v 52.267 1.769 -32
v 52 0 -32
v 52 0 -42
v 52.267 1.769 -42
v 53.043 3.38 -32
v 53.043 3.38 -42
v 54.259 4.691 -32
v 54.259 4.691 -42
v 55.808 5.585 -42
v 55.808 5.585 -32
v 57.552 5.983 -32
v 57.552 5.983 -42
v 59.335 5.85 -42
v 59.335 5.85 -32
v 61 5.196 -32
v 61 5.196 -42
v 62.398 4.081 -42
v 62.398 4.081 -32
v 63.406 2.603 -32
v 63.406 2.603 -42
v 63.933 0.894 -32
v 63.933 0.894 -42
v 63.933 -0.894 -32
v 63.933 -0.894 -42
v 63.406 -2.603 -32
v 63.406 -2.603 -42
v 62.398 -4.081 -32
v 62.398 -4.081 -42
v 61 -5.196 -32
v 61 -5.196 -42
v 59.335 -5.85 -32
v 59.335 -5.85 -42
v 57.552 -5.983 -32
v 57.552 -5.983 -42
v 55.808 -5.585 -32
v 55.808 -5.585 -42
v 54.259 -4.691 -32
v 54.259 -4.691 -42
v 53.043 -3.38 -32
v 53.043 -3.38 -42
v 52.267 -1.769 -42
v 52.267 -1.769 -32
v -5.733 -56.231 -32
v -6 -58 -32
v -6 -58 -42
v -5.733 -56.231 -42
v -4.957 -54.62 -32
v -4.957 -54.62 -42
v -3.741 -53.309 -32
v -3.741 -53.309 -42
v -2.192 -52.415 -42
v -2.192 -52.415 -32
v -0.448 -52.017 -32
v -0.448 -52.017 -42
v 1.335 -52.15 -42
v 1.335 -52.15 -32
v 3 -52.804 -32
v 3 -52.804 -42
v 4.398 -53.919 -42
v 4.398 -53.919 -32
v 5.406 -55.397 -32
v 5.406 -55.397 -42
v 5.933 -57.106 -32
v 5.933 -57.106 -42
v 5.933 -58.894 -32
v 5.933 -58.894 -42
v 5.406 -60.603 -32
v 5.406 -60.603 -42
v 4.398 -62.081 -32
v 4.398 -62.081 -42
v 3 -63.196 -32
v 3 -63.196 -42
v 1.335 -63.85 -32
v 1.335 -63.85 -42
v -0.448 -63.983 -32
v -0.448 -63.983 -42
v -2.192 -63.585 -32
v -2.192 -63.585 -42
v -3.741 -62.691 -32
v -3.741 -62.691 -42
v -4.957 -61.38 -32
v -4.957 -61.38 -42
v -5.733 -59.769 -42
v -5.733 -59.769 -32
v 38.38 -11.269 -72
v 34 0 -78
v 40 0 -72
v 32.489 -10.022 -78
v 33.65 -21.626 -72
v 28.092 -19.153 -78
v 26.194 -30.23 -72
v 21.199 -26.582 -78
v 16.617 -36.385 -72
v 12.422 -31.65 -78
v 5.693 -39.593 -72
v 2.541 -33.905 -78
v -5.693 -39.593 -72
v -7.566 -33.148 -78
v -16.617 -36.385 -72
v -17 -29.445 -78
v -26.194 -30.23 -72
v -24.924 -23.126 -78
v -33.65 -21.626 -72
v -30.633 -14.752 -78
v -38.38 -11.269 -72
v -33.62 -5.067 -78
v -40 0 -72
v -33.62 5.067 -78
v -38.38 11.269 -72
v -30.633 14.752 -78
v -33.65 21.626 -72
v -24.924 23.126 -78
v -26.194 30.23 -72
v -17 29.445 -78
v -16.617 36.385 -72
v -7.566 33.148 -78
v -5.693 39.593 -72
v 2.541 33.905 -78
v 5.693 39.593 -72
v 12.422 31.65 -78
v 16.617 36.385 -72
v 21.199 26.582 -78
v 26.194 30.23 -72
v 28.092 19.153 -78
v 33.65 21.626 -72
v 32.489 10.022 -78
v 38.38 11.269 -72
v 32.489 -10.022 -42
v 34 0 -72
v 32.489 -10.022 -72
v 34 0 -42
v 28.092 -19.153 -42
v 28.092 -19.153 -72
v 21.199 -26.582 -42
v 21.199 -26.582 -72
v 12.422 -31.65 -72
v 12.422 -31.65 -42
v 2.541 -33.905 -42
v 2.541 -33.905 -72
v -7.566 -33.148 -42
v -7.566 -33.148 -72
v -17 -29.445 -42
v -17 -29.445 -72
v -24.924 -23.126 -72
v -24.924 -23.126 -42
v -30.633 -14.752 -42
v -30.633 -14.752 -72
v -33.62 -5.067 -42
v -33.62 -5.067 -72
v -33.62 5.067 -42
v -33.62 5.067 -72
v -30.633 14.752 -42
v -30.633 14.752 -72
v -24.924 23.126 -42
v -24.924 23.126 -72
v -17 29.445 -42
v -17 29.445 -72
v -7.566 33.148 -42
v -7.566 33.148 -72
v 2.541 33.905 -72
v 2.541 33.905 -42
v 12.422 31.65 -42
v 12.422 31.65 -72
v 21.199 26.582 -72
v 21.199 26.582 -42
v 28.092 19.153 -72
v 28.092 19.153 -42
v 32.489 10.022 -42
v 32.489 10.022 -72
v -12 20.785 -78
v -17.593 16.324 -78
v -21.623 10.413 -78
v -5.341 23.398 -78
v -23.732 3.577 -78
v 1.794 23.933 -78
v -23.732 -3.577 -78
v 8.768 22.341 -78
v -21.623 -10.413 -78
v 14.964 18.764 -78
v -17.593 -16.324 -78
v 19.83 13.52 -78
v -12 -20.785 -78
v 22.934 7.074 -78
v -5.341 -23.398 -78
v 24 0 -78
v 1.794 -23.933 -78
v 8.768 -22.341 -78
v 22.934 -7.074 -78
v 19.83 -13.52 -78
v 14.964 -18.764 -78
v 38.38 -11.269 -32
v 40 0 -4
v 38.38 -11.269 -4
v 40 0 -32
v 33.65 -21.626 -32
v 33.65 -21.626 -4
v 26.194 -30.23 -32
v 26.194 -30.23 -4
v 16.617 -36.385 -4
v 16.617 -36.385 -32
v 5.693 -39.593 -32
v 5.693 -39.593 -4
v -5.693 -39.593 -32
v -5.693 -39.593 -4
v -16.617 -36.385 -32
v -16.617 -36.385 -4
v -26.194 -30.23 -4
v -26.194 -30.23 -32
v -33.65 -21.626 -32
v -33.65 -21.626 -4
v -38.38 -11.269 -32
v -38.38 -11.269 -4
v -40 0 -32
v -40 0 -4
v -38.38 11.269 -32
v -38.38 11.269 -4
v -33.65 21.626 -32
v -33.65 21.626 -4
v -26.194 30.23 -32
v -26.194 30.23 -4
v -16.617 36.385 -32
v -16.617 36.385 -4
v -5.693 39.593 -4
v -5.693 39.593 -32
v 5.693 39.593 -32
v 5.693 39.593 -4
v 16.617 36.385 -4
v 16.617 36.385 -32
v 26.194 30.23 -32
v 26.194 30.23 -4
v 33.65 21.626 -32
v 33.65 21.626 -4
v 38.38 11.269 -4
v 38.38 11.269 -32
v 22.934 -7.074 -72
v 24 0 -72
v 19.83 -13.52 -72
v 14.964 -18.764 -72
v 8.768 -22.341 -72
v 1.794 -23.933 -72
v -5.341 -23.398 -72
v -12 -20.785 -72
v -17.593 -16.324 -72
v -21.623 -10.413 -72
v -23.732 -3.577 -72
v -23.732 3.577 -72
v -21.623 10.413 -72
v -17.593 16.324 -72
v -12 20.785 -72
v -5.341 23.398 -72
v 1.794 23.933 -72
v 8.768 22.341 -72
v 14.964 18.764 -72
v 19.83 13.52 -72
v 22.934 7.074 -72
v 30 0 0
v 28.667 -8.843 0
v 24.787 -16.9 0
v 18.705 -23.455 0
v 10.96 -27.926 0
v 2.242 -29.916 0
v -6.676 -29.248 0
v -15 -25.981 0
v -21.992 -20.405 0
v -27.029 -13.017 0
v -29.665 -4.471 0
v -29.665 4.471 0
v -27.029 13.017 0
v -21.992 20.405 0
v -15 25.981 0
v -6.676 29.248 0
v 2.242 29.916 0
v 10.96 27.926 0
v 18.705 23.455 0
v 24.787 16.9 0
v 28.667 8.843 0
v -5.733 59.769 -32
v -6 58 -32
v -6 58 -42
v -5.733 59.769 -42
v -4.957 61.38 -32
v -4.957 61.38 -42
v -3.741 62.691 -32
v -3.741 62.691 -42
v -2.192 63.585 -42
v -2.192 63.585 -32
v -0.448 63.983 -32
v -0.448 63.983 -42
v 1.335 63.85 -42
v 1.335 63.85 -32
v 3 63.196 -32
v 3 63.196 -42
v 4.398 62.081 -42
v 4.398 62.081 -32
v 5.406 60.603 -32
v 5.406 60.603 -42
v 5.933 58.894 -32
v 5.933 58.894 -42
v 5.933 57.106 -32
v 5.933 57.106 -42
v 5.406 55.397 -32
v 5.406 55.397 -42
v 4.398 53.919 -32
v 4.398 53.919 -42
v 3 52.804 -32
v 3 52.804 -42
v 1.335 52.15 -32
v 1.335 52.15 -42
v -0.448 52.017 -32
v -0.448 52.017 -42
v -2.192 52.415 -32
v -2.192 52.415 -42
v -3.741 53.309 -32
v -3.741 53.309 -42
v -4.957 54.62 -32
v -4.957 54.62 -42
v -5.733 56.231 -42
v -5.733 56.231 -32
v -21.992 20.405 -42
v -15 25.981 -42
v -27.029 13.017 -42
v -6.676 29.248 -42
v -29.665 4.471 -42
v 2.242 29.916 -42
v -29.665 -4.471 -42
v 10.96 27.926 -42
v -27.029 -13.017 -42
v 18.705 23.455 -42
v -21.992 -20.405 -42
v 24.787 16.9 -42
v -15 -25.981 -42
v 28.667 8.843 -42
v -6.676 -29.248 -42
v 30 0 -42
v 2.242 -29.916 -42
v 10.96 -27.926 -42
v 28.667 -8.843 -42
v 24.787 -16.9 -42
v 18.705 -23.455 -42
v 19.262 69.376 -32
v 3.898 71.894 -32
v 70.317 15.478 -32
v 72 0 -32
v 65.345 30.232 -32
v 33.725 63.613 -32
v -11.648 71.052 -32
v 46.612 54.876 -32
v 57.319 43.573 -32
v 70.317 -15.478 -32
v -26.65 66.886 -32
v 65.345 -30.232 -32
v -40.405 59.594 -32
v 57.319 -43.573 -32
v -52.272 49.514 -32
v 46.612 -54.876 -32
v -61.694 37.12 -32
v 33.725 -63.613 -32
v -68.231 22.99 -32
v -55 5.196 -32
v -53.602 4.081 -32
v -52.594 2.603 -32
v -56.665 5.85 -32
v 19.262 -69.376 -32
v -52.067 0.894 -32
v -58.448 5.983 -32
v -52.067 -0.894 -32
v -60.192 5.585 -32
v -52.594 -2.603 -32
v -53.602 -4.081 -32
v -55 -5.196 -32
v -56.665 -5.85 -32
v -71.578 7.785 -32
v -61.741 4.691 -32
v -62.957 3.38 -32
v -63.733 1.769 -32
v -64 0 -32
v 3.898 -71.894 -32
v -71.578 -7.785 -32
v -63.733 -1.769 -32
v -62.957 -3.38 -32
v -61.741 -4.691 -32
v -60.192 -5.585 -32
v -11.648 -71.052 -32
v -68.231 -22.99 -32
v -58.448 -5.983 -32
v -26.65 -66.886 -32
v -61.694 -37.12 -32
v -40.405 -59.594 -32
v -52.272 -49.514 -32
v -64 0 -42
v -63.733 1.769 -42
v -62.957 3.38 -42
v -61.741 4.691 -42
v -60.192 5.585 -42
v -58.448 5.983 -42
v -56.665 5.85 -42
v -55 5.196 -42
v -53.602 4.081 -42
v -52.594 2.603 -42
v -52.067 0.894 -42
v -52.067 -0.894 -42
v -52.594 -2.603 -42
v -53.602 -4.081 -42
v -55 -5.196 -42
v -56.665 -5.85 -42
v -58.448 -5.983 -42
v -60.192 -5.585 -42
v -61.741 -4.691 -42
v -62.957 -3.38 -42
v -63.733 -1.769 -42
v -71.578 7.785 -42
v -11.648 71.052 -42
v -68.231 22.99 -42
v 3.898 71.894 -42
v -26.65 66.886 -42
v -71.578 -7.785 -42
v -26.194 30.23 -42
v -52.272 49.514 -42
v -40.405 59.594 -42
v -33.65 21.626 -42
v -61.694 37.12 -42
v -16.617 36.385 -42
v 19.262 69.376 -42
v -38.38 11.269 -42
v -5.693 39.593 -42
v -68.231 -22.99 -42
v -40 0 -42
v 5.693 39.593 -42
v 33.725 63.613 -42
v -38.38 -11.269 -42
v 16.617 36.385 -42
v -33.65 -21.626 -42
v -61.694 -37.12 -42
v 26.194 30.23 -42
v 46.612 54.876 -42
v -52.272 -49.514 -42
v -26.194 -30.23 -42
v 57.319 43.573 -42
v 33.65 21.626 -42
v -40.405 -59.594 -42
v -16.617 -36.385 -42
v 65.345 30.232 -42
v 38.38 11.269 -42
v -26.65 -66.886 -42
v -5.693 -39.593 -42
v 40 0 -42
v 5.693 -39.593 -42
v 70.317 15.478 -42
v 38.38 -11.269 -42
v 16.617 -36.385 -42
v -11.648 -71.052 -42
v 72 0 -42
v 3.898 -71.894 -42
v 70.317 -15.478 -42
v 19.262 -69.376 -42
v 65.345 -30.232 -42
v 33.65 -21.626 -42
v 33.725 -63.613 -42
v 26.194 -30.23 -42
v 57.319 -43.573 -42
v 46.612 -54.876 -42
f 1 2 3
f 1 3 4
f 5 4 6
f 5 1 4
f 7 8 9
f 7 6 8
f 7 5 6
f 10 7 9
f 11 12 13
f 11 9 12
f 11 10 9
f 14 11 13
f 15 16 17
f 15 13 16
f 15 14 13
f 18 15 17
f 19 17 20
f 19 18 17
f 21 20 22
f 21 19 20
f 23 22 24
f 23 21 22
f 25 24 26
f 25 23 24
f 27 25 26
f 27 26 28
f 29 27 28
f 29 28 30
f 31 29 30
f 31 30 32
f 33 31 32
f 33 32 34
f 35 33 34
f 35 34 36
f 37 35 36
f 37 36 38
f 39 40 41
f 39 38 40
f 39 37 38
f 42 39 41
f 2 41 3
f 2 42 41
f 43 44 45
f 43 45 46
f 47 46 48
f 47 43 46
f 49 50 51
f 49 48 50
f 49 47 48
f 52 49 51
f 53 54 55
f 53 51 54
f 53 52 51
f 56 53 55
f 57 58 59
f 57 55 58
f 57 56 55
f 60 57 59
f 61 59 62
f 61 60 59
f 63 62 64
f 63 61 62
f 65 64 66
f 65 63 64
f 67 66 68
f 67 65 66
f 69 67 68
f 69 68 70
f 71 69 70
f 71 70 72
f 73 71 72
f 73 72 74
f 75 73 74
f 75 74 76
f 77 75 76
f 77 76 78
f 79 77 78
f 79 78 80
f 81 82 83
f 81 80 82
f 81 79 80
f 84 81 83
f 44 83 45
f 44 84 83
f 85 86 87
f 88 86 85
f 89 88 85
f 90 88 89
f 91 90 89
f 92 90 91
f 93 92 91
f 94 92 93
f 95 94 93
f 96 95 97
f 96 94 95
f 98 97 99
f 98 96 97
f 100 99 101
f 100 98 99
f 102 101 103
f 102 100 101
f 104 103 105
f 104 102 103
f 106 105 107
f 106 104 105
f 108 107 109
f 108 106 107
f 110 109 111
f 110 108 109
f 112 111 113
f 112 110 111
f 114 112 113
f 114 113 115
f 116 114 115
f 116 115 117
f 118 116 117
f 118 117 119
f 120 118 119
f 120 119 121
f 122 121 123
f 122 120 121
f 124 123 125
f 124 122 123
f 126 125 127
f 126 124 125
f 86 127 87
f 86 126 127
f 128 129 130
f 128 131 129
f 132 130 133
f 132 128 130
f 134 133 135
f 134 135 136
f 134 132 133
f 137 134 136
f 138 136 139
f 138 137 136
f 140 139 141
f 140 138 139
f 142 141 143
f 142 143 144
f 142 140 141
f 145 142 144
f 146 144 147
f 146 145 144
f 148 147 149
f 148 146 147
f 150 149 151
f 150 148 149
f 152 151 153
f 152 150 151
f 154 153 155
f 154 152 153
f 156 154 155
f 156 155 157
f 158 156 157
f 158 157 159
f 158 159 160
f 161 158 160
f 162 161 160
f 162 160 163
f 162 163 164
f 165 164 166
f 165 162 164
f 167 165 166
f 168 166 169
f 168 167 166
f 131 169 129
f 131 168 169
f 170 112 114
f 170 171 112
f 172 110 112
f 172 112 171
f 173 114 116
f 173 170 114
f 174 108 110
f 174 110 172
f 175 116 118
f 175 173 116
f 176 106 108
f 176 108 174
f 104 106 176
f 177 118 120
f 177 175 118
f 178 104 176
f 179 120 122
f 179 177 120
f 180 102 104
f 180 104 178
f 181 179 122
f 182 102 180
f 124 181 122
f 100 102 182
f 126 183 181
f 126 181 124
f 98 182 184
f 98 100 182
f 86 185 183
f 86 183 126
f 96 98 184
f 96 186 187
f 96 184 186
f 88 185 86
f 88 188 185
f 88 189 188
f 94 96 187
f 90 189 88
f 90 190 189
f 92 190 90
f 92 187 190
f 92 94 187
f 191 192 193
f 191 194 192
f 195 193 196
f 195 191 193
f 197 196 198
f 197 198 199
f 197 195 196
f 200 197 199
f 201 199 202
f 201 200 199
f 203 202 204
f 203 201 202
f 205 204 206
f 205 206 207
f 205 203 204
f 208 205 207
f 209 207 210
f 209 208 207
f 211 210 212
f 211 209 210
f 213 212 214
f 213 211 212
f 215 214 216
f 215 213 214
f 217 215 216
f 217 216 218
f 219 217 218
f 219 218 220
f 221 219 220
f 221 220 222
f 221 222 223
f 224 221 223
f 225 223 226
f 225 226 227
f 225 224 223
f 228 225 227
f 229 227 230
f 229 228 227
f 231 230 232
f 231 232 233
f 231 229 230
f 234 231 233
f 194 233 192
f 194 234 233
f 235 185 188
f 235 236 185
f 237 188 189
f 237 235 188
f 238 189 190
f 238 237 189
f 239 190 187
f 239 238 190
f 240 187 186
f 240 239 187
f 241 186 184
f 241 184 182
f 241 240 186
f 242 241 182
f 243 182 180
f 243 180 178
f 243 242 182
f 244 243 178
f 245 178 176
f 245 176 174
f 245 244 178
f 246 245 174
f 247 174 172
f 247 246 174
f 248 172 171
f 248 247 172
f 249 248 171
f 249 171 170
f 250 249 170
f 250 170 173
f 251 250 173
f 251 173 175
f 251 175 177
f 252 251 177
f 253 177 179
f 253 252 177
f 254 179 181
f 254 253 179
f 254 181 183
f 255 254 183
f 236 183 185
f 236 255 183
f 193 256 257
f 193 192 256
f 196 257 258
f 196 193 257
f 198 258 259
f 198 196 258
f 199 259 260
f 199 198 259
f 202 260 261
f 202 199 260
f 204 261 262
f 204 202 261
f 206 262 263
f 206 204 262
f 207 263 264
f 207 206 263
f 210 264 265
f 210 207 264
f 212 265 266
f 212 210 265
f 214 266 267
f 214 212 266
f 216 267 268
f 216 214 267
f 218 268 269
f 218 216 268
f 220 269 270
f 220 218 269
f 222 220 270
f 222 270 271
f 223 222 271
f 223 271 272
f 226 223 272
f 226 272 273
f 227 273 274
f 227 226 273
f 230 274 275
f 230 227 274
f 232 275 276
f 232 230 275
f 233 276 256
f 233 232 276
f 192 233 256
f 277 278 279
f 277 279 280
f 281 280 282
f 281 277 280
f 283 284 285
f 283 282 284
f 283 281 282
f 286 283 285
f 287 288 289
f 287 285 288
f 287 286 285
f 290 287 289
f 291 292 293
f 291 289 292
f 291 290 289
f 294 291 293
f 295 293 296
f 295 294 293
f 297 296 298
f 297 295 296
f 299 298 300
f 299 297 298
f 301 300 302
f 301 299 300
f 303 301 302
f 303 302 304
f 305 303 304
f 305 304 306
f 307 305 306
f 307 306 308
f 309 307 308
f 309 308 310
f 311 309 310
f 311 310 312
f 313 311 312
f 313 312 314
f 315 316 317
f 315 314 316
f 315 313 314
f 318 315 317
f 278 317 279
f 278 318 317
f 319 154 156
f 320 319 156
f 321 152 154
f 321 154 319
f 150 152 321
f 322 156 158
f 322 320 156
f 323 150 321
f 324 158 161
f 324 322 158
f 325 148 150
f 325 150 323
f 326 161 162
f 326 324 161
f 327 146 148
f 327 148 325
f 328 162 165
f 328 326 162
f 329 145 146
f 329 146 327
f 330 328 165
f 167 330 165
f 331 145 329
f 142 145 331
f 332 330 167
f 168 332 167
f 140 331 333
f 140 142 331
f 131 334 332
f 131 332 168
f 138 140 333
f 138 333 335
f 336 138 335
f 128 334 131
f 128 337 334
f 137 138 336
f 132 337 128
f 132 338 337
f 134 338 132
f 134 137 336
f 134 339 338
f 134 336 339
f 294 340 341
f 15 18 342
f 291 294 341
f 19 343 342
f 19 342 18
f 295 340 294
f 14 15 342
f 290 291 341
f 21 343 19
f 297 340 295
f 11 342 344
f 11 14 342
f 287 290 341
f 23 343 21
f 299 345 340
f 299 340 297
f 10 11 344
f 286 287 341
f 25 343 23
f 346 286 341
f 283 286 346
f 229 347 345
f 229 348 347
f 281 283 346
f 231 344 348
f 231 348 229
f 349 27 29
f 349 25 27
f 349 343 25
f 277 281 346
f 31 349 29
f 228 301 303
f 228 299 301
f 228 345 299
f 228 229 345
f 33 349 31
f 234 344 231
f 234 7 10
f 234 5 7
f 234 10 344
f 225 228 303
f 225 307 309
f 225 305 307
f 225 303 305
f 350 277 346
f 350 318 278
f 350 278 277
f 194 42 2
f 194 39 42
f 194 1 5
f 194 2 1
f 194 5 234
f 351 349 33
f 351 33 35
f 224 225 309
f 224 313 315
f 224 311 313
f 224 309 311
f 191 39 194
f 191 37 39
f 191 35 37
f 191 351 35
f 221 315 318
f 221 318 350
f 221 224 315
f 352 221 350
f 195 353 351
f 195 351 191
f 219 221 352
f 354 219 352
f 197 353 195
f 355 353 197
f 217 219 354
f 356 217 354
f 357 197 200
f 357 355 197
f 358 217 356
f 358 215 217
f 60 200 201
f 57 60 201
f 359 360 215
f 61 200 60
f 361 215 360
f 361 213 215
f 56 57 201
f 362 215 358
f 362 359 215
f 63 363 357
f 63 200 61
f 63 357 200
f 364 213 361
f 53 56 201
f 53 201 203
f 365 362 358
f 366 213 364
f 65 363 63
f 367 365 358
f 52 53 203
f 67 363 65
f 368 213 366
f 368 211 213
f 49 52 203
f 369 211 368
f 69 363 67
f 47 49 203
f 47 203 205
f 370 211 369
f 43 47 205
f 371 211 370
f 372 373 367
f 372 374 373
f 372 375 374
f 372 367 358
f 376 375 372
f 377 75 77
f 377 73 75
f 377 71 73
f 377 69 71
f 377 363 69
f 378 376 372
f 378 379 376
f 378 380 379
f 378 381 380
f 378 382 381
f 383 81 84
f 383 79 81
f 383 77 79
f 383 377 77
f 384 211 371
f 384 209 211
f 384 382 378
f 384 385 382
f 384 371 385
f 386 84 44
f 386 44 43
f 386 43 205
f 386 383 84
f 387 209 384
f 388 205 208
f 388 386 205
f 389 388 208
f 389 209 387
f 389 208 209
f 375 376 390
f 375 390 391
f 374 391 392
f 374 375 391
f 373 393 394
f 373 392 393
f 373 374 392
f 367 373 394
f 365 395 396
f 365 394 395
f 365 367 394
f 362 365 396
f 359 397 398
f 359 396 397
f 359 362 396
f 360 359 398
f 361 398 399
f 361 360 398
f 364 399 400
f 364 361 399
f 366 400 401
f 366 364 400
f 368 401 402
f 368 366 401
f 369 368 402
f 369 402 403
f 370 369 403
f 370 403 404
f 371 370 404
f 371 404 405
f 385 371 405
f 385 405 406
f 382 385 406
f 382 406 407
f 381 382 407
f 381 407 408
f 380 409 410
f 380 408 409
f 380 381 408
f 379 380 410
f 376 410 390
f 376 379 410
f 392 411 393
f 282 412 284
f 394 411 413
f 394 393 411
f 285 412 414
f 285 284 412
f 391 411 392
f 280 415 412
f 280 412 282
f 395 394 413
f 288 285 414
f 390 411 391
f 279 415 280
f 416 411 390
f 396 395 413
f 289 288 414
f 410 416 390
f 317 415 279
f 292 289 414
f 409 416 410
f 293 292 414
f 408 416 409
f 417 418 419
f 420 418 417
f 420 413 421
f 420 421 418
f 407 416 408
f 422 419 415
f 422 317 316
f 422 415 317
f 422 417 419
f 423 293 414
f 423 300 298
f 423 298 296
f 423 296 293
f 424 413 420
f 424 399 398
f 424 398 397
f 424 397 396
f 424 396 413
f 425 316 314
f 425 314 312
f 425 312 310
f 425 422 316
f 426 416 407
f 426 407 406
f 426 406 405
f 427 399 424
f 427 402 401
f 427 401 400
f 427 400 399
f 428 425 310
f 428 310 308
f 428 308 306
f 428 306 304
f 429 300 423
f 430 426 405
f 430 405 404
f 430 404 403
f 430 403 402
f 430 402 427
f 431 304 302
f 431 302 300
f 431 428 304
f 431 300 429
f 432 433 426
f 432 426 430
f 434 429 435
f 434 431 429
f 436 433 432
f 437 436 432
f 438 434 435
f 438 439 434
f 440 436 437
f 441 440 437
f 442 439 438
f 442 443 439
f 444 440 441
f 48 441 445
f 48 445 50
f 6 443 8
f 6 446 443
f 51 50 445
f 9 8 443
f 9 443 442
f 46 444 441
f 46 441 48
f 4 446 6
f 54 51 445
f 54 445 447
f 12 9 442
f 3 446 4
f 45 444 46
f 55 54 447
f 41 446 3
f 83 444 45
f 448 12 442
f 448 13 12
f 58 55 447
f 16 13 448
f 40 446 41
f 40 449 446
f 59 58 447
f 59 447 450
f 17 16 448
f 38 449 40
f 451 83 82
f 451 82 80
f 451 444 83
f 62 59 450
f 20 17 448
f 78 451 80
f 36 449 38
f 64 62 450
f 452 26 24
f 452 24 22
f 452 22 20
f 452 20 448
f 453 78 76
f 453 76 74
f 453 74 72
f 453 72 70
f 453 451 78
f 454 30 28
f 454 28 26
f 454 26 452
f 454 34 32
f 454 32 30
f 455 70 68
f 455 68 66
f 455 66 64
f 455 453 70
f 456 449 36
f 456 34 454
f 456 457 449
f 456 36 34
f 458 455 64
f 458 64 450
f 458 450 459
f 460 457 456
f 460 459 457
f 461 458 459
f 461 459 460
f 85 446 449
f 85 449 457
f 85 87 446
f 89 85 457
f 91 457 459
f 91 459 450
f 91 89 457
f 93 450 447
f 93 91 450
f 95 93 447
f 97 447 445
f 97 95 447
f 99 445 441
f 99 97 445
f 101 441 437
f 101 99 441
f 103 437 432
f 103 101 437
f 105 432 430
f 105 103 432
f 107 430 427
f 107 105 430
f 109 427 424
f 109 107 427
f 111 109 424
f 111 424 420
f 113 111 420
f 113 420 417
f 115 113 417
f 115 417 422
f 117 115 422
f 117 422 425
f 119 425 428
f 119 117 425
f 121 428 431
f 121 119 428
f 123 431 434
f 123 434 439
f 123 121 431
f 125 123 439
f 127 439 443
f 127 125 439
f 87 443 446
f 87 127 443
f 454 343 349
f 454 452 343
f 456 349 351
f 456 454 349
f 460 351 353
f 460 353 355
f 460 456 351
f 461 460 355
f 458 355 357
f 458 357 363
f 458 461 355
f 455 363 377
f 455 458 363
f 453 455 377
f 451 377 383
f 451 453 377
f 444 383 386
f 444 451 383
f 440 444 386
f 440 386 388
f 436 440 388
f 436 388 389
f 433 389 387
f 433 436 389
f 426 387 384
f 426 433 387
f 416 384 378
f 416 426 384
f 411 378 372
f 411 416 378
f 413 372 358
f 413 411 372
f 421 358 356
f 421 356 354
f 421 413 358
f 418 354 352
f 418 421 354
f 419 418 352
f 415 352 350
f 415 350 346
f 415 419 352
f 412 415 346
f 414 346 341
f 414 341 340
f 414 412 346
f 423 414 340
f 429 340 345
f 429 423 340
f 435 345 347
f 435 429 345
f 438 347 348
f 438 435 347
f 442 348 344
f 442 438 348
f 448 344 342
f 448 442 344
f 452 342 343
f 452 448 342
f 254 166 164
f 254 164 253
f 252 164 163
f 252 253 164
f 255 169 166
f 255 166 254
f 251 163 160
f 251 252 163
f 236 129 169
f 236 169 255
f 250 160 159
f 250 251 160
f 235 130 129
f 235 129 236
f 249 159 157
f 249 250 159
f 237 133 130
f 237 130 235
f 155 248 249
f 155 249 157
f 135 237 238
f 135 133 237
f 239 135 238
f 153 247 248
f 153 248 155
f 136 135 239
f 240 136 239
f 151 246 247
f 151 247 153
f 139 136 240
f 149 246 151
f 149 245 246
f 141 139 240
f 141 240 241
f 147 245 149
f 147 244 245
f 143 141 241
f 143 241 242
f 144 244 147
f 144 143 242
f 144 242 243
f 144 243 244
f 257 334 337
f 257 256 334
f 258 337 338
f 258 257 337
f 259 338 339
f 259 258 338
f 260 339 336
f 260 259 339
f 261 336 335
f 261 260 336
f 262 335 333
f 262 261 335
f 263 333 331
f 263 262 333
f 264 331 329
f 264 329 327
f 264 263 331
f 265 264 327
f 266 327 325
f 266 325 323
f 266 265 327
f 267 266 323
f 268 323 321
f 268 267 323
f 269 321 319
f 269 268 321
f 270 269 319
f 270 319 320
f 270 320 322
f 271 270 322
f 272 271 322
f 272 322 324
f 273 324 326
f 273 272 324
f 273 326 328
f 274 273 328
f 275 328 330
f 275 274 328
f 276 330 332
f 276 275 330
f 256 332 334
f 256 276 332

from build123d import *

# Parameters (mm, degrees)
CUT_EXTRUDE1_DEPTH      = 111.145358504
CUT_EXTRUDE1_DEPTH_BACK = 111.145358504
SKETCH2_R               = 6


with BuildPart() as part:
    # Sketch1 → Revolve1 (revolve)
    with BuildSketch(Plane(origin=(0, 0, 0), x_dir=(1, 0, 0), z_dir=(0, 1, 0))):
        Polygon((24, 78), (24, 72), (34, 72), (34, 42), (30, 42), (30, 0), (40, 4), (40, 32), (72, 32), (72, 42), (40, 42), (40, 72), (34, 78), align=None)
    revolve(axis=Axis((0, 0, 0), (0, 0, -1)))

    # Sketch2 → Cut-Extrude1 (cut, two sides: drawn at the far end of the back side and taken through both)
    with BuildSketch(Plane(origin=(0, 0, -42), x_dir=(-1, 0, 0), z_dir=(0, 0, -1)).offset(-CUT_EXTRUDE1_DEPTH_BACK)):
        with Locations((0, 58)):
            Circle(SKETCH2_R)
        with Locations((58, 0)):
            Circle(SKETCH2_R)
        with Locations((0, -58)):
            Circle(SKETCH2_R)
        with Locations((-58, 0)):
            Circle(SKETCH2_R)
    extrude(amount=CUT_EXTRUDE1_DEPTH + CUT_EXTRUDE1_DEPTH_BACK, mode=Mode.SUBTRACT)


solid = part.part
